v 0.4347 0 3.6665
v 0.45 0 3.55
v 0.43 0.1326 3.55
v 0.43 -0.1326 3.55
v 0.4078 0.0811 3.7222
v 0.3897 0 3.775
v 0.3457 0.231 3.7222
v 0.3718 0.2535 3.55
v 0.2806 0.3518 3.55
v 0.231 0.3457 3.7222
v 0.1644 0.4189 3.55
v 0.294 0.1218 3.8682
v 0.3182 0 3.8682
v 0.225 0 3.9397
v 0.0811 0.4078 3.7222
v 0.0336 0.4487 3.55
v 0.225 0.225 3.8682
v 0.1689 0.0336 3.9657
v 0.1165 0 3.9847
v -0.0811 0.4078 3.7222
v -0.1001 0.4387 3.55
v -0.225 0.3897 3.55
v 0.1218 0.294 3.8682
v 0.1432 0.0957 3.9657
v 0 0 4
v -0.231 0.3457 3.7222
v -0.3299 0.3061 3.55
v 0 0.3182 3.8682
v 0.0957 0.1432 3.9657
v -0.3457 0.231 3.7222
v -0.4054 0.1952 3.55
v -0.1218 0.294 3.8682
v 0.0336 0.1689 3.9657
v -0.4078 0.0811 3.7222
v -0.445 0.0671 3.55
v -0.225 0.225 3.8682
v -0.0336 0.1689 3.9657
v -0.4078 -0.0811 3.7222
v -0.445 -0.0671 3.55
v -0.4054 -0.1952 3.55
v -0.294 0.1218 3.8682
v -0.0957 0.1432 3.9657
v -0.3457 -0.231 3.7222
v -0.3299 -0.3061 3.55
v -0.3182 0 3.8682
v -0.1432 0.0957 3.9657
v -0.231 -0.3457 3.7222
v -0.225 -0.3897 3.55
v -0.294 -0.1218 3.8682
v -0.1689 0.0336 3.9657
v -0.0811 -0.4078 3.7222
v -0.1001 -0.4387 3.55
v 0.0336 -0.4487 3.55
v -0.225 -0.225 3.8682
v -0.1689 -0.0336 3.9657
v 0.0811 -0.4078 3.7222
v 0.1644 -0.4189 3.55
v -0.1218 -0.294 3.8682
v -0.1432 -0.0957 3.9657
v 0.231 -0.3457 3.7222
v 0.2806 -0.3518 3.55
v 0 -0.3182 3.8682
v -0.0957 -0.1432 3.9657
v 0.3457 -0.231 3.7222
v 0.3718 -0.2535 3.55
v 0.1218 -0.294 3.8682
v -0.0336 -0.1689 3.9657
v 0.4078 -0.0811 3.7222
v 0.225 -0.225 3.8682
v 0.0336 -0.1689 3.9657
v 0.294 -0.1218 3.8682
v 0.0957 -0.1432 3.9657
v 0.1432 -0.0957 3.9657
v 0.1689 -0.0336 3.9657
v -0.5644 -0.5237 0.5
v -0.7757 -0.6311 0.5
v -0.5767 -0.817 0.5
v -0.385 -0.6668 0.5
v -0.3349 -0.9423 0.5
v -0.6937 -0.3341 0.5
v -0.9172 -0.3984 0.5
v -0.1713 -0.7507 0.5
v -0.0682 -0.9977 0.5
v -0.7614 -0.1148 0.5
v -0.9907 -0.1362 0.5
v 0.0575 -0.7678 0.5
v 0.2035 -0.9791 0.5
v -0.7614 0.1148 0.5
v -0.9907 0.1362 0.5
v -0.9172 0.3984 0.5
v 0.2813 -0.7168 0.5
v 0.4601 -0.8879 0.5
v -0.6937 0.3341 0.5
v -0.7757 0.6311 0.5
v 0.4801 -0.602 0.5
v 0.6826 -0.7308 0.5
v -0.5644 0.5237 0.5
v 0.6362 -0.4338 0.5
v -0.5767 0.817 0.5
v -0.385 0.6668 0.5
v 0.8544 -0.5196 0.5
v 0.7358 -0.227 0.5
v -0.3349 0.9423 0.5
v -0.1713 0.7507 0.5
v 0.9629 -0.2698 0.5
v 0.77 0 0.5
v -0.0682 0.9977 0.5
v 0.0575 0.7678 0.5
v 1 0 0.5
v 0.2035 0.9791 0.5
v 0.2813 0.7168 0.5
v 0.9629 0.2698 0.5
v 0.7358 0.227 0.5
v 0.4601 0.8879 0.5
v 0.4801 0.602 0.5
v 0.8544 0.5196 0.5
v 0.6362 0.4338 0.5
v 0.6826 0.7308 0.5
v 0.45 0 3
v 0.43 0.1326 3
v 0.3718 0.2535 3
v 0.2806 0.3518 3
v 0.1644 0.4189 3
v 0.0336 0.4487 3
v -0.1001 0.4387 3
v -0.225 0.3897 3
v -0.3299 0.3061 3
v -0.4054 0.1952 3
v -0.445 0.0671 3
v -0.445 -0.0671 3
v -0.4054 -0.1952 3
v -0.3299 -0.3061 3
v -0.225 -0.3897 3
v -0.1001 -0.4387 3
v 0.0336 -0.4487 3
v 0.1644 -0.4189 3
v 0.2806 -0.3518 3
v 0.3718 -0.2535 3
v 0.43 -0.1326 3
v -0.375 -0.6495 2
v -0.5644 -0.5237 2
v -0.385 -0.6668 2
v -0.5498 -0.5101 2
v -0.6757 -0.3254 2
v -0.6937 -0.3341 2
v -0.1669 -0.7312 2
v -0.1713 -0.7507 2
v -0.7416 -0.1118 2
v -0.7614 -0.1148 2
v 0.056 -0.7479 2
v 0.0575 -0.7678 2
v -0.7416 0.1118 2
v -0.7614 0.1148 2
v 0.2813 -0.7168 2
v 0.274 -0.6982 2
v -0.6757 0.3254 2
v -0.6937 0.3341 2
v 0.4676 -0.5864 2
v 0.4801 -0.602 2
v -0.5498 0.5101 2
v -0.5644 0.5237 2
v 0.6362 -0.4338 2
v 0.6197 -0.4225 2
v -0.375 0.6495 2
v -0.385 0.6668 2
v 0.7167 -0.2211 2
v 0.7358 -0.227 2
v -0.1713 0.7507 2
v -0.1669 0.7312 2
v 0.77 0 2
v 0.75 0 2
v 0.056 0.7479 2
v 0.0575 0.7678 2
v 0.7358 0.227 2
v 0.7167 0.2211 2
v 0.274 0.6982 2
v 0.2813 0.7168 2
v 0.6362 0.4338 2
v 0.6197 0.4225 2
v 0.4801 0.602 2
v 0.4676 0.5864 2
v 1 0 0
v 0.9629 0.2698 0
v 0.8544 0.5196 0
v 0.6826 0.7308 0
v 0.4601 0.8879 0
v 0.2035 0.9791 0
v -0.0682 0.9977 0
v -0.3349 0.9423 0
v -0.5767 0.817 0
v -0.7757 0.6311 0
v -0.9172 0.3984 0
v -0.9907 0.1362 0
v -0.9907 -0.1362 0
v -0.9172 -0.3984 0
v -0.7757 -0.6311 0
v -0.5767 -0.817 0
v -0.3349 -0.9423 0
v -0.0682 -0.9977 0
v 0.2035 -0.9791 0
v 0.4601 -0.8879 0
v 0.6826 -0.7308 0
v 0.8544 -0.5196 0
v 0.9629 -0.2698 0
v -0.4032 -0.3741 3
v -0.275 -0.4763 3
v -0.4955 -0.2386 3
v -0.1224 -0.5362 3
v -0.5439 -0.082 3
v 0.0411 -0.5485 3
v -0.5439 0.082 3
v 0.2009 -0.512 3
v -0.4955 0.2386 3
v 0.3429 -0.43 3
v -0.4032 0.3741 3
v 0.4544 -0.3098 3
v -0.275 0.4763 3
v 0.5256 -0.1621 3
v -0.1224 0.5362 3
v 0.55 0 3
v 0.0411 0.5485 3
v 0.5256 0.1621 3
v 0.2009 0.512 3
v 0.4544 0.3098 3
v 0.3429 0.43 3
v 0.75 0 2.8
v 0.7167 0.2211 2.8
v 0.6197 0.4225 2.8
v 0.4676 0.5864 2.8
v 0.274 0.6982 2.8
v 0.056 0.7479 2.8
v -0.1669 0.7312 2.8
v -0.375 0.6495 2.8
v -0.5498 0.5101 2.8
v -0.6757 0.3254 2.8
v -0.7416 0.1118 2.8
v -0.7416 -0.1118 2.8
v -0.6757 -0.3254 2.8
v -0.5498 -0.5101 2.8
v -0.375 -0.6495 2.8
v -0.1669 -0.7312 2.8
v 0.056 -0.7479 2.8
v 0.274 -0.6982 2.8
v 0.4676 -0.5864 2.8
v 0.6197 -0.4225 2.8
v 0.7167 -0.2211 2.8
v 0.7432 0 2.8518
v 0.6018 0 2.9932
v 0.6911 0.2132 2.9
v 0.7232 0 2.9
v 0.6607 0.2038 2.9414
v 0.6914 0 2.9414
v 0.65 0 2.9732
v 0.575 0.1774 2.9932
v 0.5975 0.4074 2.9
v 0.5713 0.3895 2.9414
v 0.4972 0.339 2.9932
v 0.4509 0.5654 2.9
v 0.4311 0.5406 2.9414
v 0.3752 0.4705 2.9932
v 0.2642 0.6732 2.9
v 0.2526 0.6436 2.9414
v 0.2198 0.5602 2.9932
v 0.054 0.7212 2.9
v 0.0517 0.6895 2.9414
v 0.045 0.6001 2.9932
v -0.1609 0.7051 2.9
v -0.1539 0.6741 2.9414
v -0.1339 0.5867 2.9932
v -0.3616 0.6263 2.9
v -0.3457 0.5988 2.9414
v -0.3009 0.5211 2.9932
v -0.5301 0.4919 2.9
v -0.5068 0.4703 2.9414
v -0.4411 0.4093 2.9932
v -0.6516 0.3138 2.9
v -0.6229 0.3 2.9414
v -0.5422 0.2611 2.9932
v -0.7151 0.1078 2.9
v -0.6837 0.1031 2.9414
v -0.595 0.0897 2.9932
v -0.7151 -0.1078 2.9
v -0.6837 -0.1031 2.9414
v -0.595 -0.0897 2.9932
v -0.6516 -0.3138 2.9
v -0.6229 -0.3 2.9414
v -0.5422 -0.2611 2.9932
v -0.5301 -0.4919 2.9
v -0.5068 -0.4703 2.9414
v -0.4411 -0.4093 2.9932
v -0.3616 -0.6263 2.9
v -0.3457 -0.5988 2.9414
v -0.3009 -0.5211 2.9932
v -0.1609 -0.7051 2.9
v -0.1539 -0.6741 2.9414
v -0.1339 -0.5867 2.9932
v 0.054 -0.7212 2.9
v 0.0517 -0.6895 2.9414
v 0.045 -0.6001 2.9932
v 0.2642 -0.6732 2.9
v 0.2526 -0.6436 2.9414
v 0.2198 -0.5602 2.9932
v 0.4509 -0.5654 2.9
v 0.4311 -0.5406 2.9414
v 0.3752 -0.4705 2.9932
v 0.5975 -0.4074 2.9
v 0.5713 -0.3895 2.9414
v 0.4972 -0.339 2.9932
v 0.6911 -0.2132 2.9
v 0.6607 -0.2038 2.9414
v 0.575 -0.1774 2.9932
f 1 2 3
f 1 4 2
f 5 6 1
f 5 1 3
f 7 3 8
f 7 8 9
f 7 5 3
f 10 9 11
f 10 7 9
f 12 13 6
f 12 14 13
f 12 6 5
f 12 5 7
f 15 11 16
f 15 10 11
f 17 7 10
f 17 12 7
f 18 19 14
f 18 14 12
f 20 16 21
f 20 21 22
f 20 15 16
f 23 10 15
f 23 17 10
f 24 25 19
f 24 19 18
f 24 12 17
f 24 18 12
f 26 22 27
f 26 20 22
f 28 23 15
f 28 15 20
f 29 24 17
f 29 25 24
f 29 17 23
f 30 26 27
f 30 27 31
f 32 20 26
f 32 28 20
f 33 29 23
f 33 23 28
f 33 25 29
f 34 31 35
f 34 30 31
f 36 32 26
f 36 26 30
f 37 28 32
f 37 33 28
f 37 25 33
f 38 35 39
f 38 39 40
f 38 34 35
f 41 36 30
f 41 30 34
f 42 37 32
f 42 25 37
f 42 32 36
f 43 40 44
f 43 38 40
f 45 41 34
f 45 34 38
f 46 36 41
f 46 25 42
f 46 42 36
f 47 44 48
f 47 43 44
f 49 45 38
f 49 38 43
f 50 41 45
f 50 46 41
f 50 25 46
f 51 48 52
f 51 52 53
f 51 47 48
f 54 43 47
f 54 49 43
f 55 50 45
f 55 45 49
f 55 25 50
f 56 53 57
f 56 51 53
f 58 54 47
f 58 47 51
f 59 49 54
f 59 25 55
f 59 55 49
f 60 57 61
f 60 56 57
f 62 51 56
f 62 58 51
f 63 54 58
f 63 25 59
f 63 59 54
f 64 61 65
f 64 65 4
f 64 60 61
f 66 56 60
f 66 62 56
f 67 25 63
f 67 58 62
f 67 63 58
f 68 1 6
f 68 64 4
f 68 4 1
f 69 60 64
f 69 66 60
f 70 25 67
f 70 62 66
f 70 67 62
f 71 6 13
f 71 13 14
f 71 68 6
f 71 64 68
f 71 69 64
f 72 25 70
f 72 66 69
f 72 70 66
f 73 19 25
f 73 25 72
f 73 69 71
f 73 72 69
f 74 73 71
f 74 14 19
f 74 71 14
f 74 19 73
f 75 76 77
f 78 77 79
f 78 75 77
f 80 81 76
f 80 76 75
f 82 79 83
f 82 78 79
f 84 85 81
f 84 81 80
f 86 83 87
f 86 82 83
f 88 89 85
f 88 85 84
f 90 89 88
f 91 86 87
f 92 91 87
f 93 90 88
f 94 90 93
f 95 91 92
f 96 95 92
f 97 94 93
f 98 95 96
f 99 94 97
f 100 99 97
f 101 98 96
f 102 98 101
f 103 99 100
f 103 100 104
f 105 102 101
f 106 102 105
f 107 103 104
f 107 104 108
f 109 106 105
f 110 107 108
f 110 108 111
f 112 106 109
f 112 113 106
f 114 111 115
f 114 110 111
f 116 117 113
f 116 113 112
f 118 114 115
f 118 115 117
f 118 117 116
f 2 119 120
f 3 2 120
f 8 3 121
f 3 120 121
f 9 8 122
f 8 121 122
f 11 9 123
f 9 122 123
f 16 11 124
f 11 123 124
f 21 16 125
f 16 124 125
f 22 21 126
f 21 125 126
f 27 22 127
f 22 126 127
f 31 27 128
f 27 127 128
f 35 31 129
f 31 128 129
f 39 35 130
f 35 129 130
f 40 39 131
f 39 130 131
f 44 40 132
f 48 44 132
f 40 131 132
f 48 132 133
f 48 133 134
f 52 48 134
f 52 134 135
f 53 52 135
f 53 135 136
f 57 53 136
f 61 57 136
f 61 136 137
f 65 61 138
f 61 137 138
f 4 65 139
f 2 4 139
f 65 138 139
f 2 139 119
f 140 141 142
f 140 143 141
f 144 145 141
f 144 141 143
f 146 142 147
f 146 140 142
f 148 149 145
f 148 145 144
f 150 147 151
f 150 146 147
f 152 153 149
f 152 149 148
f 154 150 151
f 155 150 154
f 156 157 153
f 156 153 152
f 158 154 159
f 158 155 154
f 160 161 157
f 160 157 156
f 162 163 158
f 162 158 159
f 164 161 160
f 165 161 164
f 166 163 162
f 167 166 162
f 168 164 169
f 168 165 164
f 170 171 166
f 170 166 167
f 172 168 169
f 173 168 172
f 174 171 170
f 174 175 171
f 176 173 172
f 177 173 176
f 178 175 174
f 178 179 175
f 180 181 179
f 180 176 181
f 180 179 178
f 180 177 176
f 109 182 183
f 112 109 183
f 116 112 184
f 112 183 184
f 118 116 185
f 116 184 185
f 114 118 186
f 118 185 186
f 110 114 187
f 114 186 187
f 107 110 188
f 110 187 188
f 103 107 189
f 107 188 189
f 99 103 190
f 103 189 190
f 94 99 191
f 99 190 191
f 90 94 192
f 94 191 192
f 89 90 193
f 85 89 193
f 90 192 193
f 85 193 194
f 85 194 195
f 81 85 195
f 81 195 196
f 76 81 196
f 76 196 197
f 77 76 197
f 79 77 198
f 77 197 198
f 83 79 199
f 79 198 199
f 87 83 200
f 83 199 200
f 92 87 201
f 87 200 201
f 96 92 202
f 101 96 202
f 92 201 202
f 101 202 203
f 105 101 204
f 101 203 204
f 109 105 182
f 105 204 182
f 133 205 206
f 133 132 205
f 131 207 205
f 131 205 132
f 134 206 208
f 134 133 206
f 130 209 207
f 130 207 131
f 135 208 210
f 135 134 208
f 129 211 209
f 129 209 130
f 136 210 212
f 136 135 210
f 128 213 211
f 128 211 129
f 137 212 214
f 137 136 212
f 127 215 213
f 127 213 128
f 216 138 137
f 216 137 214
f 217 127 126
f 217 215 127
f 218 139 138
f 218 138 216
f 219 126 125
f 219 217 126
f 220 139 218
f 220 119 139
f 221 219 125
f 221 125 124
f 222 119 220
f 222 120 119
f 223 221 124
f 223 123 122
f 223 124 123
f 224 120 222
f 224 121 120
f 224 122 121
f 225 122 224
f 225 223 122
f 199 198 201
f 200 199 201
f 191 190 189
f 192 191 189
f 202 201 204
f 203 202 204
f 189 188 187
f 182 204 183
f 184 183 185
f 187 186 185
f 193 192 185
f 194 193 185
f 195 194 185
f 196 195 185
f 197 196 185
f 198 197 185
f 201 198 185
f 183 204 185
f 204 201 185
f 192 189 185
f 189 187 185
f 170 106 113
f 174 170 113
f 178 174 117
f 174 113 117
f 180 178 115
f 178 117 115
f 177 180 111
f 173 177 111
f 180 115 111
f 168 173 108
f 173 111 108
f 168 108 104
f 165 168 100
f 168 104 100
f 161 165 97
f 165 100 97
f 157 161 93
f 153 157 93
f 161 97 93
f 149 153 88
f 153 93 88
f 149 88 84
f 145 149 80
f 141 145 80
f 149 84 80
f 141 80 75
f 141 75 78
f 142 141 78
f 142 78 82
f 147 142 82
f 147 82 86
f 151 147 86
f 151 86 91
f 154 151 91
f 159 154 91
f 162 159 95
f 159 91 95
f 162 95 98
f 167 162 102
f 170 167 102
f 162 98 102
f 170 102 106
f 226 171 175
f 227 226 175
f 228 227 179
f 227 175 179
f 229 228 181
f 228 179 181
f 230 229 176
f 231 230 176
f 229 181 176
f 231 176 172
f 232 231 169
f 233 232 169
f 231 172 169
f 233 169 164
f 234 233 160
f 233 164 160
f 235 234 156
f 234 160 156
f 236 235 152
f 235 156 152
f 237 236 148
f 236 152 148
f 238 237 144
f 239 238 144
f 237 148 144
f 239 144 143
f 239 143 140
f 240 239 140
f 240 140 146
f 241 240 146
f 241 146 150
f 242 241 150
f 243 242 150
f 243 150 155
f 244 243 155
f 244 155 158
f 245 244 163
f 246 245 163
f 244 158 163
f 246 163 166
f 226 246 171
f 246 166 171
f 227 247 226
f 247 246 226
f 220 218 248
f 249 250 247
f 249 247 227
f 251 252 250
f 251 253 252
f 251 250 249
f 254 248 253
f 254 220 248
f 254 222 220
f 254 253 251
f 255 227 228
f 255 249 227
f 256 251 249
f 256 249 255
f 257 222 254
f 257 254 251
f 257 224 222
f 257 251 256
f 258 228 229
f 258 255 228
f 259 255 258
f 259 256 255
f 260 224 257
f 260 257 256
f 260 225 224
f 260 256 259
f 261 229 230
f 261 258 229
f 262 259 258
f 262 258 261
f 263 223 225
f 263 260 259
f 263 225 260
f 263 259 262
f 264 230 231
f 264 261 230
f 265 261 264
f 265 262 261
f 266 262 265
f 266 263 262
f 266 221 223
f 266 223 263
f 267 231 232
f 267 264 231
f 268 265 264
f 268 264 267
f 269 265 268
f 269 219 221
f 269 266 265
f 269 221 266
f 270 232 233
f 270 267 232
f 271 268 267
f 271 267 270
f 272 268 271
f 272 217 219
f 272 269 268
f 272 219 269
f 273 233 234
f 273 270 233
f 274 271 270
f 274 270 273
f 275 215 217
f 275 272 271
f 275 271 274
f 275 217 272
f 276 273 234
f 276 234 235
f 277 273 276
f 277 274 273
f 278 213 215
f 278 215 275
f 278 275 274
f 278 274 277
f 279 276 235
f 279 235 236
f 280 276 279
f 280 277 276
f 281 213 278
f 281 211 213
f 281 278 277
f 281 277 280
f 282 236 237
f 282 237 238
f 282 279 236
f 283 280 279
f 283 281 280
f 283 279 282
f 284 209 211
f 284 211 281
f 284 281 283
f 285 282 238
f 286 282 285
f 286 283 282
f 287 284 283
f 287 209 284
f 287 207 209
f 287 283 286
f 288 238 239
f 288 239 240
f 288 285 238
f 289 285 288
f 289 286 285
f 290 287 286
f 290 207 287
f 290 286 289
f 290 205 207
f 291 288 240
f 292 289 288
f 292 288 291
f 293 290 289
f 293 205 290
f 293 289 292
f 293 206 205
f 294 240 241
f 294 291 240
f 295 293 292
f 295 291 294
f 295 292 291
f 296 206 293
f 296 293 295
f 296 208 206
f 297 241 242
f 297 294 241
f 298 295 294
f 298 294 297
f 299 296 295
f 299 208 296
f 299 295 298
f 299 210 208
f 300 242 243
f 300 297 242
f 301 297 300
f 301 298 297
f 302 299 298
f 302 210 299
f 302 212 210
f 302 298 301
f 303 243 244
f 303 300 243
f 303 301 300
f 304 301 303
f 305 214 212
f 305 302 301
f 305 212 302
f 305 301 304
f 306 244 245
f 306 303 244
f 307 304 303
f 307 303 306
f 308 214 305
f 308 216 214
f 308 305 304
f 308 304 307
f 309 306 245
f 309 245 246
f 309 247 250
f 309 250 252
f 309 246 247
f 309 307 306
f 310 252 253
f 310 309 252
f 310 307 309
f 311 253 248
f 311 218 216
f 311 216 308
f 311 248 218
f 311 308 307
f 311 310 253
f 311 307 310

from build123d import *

# Parameters (mm, degrees)
SKETCH_R     = 1
PAD_DEPTH    = 0.5
SKETCH002_R  = 0.77
PAD001_DEPTH = 1.5
SKETCH003_R  = 0.75
PAD002_DEPTH = 1
FILLET_R     = 0.2
SKETCH004_R  = 0.45
PAD003_DEPTH = 1
FILLET001_R  = 0.45


with BuildPart() as part:
    # Sketch → Pad (new body)
    with BuildSketch(Plane.XY):
        Circle(SKETCH_R)
    extrude(amount=PAD_DEPTH)

    # Sketch002 (on Face3 of Pad) → Pad001 (join)
    with BuildSketch(Plane.XY.offset(0.5)):
        Circle(SKETCH002_R)
    extrude(amount=PAD001_DEPTH)

    # Sketch003 (on Face5 of Pad001) → Pad002 (join)
    with BuildSketch(Plane.XY.offset(2)):
        Circle(SKETCH003_R)
    extrude(amount=PAD002_DEPTH)

    # Fillet
    fillet_edges = [part.edges().sort_by_distance(p)[0] for p in [
        (-0.75, 0, 3),
    ]]
    fillet(fillet_edges, radius=FILLET_R)

    # Sketch004 (on Face4 of Fillet) → Pad003 (join)
    with BuildSketch(Plane.XY.offset(3)):
        Circle(SKETCH004_R)
    extrude(amount=PAD003_DEPTH)

    # Fillet001
    fillet001_edges = [part.edges().sort_by_distance(p)[0] for p in [
        (-0.45, 0, 4),
    ]]
    fillet(fillet001_edges, radius=FILLET001_R)


solid = part.part
